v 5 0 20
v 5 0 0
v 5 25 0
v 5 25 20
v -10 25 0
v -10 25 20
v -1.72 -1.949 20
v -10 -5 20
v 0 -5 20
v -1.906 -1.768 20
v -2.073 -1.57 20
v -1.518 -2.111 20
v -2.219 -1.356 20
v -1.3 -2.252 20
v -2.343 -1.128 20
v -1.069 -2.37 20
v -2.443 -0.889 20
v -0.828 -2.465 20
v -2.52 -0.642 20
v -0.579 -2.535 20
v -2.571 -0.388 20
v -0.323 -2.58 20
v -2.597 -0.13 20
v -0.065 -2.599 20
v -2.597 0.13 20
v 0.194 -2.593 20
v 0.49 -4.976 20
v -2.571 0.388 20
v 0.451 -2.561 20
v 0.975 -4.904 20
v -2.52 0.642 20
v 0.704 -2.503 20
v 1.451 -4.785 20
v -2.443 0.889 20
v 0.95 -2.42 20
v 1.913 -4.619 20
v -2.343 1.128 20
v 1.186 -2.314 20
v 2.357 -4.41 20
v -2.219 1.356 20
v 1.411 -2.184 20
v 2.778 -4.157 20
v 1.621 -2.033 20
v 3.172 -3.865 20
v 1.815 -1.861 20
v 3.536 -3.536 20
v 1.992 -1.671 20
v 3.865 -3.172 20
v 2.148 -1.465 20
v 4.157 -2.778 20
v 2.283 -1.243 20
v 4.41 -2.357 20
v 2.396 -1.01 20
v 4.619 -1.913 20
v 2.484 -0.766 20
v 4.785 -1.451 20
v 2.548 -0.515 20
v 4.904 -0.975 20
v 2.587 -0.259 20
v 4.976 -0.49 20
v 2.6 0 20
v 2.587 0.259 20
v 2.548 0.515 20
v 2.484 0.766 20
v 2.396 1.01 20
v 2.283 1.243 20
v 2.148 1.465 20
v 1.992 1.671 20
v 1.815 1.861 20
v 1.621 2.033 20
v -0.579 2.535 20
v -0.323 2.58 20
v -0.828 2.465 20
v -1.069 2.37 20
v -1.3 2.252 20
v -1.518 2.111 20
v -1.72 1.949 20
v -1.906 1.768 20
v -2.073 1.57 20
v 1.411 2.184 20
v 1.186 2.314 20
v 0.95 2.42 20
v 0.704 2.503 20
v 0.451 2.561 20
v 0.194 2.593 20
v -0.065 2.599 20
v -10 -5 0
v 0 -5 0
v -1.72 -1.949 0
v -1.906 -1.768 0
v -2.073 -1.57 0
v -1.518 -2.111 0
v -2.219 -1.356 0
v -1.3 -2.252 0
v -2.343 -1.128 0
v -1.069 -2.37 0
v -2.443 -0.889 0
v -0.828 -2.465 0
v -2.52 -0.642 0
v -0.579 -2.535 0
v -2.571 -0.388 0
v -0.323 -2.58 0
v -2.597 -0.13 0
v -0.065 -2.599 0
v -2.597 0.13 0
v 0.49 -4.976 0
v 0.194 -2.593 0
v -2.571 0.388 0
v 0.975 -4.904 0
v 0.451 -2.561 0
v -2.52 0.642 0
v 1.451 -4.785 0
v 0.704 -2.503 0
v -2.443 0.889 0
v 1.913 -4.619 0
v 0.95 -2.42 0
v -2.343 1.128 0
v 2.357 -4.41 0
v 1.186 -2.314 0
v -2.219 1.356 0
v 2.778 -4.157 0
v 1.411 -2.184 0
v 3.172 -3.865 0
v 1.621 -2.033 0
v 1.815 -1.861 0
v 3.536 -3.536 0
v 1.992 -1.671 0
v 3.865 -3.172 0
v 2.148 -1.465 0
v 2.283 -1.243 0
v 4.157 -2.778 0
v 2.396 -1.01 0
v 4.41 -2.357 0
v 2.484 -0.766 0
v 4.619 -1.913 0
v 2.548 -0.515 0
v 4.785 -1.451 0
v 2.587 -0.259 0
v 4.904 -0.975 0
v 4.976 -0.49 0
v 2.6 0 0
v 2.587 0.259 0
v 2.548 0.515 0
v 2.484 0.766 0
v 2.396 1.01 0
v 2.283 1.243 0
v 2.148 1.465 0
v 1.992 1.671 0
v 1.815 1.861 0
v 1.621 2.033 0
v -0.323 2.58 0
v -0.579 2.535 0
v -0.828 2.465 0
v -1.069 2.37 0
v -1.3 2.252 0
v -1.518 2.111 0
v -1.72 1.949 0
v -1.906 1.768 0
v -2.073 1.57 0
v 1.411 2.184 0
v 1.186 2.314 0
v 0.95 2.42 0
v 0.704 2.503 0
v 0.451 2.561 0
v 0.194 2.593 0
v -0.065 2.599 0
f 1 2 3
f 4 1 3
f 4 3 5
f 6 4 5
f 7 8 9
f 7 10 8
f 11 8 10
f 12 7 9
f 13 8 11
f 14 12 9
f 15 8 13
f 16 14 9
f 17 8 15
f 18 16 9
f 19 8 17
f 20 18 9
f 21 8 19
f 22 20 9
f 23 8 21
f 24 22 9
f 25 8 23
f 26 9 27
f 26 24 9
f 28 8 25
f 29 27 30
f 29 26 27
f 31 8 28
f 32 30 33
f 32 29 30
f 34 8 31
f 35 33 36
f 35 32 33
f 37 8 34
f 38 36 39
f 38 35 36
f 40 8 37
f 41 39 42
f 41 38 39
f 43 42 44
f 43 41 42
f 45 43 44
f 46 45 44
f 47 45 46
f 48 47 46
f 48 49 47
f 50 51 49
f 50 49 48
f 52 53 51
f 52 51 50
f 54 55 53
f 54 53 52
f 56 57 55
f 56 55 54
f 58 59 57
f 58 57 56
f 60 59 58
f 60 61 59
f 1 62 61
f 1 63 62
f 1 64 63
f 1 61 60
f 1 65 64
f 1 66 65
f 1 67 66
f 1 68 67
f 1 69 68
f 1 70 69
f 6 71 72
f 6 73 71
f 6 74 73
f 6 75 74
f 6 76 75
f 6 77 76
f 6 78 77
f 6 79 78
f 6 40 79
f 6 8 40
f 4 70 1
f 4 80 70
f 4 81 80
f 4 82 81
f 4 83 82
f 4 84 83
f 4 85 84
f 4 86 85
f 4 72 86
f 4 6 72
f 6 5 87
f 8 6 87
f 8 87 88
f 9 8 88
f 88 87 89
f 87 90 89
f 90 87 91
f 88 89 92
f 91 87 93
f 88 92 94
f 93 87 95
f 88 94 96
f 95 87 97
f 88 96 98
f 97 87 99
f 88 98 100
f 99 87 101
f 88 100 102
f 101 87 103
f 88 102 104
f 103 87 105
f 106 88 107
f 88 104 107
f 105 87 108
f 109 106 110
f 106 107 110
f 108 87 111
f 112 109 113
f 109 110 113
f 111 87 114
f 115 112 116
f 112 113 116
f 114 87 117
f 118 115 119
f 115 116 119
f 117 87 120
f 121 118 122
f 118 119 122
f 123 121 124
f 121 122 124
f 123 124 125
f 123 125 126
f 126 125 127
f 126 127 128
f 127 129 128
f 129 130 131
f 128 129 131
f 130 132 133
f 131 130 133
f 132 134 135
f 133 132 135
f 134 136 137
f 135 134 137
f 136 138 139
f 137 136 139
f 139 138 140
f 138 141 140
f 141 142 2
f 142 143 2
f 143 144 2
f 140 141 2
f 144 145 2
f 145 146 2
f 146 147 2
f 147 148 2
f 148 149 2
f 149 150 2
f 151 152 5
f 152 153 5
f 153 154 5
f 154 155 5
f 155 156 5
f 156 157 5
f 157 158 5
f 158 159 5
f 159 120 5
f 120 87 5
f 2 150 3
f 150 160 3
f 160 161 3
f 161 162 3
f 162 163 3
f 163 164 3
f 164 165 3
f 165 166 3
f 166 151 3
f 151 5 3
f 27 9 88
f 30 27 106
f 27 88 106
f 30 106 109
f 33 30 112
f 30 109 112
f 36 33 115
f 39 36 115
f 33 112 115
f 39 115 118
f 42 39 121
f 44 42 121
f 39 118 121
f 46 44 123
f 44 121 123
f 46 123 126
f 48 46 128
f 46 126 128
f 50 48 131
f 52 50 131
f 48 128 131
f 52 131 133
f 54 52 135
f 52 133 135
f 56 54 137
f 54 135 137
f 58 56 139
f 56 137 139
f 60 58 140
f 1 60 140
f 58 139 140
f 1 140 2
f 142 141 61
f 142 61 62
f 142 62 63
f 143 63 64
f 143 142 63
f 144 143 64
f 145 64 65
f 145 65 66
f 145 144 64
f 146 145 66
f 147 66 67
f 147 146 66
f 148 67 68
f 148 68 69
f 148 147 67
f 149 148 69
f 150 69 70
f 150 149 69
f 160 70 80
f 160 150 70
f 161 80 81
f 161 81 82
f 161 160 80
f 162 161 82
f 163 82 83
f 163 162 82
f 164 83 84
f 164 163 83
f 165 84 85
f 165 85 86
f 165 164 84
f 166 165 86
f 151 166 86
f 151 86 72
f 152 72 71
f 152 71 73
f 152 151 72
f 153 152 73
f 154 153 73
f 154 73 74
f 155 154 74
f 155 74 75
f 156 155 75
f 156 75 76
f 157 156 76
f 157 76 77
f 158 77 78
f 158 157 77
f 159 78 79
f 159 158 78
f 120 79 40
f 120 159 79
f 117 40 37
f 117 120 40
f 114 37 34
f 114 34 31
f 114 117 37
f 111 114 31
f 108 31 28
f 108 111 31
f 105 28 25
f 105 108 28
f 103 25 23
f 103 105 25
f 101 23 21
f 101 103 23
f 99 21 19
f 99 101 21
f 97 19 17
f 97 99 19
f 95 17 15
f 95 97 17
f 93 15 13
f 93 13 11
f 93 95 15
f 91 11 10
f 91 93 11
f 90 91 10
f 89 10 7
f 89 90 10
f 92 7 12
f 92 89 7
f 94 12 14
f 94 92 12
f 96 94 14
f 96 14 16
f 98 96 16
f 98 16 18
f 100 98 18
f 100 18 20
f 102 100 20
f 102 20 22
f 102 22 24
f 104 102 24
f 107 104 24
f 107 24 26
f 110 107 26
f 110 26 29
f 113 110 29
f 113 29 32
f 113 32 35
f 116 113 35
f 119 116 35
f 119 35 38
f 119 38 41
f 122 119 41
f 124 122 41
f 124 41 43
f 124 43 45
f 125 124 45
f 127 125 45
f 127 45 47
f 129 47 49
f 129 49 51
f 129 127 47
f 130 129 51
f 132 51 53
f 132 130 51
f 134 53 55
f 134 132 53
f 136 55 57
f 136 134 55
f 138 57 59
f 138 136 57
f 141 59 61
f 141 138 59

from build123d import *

# Parameters (mm, degrees)
CROQUIS2_R              = 2.6
SALIENTE_EXTRUIR2_DEPTH = 20


with BuildPart() as part:
    # Croquis2 → Saliente-Extruir2 (new body)
    with BuildSketch(Plane.XY):
        with BuildLine():
            Line((5, 0), (5, 25))
            Line((5, 25), (0, 25))
            Line((0, 25), (-10, 25))
            Line((-10, 25), (-10, -5))
            Line((-10, -5), (0, -5))
            ThreePointArc((0, -5), (3.535533906, -3.535533906), (5, 0))
        make_face()
        Circle(CROQUIS2_R, mode=Mode.SUBTRACT)
    extrude(amount=SALIENTE_EXTRUIR2_DEPTH)


solid = part.part
